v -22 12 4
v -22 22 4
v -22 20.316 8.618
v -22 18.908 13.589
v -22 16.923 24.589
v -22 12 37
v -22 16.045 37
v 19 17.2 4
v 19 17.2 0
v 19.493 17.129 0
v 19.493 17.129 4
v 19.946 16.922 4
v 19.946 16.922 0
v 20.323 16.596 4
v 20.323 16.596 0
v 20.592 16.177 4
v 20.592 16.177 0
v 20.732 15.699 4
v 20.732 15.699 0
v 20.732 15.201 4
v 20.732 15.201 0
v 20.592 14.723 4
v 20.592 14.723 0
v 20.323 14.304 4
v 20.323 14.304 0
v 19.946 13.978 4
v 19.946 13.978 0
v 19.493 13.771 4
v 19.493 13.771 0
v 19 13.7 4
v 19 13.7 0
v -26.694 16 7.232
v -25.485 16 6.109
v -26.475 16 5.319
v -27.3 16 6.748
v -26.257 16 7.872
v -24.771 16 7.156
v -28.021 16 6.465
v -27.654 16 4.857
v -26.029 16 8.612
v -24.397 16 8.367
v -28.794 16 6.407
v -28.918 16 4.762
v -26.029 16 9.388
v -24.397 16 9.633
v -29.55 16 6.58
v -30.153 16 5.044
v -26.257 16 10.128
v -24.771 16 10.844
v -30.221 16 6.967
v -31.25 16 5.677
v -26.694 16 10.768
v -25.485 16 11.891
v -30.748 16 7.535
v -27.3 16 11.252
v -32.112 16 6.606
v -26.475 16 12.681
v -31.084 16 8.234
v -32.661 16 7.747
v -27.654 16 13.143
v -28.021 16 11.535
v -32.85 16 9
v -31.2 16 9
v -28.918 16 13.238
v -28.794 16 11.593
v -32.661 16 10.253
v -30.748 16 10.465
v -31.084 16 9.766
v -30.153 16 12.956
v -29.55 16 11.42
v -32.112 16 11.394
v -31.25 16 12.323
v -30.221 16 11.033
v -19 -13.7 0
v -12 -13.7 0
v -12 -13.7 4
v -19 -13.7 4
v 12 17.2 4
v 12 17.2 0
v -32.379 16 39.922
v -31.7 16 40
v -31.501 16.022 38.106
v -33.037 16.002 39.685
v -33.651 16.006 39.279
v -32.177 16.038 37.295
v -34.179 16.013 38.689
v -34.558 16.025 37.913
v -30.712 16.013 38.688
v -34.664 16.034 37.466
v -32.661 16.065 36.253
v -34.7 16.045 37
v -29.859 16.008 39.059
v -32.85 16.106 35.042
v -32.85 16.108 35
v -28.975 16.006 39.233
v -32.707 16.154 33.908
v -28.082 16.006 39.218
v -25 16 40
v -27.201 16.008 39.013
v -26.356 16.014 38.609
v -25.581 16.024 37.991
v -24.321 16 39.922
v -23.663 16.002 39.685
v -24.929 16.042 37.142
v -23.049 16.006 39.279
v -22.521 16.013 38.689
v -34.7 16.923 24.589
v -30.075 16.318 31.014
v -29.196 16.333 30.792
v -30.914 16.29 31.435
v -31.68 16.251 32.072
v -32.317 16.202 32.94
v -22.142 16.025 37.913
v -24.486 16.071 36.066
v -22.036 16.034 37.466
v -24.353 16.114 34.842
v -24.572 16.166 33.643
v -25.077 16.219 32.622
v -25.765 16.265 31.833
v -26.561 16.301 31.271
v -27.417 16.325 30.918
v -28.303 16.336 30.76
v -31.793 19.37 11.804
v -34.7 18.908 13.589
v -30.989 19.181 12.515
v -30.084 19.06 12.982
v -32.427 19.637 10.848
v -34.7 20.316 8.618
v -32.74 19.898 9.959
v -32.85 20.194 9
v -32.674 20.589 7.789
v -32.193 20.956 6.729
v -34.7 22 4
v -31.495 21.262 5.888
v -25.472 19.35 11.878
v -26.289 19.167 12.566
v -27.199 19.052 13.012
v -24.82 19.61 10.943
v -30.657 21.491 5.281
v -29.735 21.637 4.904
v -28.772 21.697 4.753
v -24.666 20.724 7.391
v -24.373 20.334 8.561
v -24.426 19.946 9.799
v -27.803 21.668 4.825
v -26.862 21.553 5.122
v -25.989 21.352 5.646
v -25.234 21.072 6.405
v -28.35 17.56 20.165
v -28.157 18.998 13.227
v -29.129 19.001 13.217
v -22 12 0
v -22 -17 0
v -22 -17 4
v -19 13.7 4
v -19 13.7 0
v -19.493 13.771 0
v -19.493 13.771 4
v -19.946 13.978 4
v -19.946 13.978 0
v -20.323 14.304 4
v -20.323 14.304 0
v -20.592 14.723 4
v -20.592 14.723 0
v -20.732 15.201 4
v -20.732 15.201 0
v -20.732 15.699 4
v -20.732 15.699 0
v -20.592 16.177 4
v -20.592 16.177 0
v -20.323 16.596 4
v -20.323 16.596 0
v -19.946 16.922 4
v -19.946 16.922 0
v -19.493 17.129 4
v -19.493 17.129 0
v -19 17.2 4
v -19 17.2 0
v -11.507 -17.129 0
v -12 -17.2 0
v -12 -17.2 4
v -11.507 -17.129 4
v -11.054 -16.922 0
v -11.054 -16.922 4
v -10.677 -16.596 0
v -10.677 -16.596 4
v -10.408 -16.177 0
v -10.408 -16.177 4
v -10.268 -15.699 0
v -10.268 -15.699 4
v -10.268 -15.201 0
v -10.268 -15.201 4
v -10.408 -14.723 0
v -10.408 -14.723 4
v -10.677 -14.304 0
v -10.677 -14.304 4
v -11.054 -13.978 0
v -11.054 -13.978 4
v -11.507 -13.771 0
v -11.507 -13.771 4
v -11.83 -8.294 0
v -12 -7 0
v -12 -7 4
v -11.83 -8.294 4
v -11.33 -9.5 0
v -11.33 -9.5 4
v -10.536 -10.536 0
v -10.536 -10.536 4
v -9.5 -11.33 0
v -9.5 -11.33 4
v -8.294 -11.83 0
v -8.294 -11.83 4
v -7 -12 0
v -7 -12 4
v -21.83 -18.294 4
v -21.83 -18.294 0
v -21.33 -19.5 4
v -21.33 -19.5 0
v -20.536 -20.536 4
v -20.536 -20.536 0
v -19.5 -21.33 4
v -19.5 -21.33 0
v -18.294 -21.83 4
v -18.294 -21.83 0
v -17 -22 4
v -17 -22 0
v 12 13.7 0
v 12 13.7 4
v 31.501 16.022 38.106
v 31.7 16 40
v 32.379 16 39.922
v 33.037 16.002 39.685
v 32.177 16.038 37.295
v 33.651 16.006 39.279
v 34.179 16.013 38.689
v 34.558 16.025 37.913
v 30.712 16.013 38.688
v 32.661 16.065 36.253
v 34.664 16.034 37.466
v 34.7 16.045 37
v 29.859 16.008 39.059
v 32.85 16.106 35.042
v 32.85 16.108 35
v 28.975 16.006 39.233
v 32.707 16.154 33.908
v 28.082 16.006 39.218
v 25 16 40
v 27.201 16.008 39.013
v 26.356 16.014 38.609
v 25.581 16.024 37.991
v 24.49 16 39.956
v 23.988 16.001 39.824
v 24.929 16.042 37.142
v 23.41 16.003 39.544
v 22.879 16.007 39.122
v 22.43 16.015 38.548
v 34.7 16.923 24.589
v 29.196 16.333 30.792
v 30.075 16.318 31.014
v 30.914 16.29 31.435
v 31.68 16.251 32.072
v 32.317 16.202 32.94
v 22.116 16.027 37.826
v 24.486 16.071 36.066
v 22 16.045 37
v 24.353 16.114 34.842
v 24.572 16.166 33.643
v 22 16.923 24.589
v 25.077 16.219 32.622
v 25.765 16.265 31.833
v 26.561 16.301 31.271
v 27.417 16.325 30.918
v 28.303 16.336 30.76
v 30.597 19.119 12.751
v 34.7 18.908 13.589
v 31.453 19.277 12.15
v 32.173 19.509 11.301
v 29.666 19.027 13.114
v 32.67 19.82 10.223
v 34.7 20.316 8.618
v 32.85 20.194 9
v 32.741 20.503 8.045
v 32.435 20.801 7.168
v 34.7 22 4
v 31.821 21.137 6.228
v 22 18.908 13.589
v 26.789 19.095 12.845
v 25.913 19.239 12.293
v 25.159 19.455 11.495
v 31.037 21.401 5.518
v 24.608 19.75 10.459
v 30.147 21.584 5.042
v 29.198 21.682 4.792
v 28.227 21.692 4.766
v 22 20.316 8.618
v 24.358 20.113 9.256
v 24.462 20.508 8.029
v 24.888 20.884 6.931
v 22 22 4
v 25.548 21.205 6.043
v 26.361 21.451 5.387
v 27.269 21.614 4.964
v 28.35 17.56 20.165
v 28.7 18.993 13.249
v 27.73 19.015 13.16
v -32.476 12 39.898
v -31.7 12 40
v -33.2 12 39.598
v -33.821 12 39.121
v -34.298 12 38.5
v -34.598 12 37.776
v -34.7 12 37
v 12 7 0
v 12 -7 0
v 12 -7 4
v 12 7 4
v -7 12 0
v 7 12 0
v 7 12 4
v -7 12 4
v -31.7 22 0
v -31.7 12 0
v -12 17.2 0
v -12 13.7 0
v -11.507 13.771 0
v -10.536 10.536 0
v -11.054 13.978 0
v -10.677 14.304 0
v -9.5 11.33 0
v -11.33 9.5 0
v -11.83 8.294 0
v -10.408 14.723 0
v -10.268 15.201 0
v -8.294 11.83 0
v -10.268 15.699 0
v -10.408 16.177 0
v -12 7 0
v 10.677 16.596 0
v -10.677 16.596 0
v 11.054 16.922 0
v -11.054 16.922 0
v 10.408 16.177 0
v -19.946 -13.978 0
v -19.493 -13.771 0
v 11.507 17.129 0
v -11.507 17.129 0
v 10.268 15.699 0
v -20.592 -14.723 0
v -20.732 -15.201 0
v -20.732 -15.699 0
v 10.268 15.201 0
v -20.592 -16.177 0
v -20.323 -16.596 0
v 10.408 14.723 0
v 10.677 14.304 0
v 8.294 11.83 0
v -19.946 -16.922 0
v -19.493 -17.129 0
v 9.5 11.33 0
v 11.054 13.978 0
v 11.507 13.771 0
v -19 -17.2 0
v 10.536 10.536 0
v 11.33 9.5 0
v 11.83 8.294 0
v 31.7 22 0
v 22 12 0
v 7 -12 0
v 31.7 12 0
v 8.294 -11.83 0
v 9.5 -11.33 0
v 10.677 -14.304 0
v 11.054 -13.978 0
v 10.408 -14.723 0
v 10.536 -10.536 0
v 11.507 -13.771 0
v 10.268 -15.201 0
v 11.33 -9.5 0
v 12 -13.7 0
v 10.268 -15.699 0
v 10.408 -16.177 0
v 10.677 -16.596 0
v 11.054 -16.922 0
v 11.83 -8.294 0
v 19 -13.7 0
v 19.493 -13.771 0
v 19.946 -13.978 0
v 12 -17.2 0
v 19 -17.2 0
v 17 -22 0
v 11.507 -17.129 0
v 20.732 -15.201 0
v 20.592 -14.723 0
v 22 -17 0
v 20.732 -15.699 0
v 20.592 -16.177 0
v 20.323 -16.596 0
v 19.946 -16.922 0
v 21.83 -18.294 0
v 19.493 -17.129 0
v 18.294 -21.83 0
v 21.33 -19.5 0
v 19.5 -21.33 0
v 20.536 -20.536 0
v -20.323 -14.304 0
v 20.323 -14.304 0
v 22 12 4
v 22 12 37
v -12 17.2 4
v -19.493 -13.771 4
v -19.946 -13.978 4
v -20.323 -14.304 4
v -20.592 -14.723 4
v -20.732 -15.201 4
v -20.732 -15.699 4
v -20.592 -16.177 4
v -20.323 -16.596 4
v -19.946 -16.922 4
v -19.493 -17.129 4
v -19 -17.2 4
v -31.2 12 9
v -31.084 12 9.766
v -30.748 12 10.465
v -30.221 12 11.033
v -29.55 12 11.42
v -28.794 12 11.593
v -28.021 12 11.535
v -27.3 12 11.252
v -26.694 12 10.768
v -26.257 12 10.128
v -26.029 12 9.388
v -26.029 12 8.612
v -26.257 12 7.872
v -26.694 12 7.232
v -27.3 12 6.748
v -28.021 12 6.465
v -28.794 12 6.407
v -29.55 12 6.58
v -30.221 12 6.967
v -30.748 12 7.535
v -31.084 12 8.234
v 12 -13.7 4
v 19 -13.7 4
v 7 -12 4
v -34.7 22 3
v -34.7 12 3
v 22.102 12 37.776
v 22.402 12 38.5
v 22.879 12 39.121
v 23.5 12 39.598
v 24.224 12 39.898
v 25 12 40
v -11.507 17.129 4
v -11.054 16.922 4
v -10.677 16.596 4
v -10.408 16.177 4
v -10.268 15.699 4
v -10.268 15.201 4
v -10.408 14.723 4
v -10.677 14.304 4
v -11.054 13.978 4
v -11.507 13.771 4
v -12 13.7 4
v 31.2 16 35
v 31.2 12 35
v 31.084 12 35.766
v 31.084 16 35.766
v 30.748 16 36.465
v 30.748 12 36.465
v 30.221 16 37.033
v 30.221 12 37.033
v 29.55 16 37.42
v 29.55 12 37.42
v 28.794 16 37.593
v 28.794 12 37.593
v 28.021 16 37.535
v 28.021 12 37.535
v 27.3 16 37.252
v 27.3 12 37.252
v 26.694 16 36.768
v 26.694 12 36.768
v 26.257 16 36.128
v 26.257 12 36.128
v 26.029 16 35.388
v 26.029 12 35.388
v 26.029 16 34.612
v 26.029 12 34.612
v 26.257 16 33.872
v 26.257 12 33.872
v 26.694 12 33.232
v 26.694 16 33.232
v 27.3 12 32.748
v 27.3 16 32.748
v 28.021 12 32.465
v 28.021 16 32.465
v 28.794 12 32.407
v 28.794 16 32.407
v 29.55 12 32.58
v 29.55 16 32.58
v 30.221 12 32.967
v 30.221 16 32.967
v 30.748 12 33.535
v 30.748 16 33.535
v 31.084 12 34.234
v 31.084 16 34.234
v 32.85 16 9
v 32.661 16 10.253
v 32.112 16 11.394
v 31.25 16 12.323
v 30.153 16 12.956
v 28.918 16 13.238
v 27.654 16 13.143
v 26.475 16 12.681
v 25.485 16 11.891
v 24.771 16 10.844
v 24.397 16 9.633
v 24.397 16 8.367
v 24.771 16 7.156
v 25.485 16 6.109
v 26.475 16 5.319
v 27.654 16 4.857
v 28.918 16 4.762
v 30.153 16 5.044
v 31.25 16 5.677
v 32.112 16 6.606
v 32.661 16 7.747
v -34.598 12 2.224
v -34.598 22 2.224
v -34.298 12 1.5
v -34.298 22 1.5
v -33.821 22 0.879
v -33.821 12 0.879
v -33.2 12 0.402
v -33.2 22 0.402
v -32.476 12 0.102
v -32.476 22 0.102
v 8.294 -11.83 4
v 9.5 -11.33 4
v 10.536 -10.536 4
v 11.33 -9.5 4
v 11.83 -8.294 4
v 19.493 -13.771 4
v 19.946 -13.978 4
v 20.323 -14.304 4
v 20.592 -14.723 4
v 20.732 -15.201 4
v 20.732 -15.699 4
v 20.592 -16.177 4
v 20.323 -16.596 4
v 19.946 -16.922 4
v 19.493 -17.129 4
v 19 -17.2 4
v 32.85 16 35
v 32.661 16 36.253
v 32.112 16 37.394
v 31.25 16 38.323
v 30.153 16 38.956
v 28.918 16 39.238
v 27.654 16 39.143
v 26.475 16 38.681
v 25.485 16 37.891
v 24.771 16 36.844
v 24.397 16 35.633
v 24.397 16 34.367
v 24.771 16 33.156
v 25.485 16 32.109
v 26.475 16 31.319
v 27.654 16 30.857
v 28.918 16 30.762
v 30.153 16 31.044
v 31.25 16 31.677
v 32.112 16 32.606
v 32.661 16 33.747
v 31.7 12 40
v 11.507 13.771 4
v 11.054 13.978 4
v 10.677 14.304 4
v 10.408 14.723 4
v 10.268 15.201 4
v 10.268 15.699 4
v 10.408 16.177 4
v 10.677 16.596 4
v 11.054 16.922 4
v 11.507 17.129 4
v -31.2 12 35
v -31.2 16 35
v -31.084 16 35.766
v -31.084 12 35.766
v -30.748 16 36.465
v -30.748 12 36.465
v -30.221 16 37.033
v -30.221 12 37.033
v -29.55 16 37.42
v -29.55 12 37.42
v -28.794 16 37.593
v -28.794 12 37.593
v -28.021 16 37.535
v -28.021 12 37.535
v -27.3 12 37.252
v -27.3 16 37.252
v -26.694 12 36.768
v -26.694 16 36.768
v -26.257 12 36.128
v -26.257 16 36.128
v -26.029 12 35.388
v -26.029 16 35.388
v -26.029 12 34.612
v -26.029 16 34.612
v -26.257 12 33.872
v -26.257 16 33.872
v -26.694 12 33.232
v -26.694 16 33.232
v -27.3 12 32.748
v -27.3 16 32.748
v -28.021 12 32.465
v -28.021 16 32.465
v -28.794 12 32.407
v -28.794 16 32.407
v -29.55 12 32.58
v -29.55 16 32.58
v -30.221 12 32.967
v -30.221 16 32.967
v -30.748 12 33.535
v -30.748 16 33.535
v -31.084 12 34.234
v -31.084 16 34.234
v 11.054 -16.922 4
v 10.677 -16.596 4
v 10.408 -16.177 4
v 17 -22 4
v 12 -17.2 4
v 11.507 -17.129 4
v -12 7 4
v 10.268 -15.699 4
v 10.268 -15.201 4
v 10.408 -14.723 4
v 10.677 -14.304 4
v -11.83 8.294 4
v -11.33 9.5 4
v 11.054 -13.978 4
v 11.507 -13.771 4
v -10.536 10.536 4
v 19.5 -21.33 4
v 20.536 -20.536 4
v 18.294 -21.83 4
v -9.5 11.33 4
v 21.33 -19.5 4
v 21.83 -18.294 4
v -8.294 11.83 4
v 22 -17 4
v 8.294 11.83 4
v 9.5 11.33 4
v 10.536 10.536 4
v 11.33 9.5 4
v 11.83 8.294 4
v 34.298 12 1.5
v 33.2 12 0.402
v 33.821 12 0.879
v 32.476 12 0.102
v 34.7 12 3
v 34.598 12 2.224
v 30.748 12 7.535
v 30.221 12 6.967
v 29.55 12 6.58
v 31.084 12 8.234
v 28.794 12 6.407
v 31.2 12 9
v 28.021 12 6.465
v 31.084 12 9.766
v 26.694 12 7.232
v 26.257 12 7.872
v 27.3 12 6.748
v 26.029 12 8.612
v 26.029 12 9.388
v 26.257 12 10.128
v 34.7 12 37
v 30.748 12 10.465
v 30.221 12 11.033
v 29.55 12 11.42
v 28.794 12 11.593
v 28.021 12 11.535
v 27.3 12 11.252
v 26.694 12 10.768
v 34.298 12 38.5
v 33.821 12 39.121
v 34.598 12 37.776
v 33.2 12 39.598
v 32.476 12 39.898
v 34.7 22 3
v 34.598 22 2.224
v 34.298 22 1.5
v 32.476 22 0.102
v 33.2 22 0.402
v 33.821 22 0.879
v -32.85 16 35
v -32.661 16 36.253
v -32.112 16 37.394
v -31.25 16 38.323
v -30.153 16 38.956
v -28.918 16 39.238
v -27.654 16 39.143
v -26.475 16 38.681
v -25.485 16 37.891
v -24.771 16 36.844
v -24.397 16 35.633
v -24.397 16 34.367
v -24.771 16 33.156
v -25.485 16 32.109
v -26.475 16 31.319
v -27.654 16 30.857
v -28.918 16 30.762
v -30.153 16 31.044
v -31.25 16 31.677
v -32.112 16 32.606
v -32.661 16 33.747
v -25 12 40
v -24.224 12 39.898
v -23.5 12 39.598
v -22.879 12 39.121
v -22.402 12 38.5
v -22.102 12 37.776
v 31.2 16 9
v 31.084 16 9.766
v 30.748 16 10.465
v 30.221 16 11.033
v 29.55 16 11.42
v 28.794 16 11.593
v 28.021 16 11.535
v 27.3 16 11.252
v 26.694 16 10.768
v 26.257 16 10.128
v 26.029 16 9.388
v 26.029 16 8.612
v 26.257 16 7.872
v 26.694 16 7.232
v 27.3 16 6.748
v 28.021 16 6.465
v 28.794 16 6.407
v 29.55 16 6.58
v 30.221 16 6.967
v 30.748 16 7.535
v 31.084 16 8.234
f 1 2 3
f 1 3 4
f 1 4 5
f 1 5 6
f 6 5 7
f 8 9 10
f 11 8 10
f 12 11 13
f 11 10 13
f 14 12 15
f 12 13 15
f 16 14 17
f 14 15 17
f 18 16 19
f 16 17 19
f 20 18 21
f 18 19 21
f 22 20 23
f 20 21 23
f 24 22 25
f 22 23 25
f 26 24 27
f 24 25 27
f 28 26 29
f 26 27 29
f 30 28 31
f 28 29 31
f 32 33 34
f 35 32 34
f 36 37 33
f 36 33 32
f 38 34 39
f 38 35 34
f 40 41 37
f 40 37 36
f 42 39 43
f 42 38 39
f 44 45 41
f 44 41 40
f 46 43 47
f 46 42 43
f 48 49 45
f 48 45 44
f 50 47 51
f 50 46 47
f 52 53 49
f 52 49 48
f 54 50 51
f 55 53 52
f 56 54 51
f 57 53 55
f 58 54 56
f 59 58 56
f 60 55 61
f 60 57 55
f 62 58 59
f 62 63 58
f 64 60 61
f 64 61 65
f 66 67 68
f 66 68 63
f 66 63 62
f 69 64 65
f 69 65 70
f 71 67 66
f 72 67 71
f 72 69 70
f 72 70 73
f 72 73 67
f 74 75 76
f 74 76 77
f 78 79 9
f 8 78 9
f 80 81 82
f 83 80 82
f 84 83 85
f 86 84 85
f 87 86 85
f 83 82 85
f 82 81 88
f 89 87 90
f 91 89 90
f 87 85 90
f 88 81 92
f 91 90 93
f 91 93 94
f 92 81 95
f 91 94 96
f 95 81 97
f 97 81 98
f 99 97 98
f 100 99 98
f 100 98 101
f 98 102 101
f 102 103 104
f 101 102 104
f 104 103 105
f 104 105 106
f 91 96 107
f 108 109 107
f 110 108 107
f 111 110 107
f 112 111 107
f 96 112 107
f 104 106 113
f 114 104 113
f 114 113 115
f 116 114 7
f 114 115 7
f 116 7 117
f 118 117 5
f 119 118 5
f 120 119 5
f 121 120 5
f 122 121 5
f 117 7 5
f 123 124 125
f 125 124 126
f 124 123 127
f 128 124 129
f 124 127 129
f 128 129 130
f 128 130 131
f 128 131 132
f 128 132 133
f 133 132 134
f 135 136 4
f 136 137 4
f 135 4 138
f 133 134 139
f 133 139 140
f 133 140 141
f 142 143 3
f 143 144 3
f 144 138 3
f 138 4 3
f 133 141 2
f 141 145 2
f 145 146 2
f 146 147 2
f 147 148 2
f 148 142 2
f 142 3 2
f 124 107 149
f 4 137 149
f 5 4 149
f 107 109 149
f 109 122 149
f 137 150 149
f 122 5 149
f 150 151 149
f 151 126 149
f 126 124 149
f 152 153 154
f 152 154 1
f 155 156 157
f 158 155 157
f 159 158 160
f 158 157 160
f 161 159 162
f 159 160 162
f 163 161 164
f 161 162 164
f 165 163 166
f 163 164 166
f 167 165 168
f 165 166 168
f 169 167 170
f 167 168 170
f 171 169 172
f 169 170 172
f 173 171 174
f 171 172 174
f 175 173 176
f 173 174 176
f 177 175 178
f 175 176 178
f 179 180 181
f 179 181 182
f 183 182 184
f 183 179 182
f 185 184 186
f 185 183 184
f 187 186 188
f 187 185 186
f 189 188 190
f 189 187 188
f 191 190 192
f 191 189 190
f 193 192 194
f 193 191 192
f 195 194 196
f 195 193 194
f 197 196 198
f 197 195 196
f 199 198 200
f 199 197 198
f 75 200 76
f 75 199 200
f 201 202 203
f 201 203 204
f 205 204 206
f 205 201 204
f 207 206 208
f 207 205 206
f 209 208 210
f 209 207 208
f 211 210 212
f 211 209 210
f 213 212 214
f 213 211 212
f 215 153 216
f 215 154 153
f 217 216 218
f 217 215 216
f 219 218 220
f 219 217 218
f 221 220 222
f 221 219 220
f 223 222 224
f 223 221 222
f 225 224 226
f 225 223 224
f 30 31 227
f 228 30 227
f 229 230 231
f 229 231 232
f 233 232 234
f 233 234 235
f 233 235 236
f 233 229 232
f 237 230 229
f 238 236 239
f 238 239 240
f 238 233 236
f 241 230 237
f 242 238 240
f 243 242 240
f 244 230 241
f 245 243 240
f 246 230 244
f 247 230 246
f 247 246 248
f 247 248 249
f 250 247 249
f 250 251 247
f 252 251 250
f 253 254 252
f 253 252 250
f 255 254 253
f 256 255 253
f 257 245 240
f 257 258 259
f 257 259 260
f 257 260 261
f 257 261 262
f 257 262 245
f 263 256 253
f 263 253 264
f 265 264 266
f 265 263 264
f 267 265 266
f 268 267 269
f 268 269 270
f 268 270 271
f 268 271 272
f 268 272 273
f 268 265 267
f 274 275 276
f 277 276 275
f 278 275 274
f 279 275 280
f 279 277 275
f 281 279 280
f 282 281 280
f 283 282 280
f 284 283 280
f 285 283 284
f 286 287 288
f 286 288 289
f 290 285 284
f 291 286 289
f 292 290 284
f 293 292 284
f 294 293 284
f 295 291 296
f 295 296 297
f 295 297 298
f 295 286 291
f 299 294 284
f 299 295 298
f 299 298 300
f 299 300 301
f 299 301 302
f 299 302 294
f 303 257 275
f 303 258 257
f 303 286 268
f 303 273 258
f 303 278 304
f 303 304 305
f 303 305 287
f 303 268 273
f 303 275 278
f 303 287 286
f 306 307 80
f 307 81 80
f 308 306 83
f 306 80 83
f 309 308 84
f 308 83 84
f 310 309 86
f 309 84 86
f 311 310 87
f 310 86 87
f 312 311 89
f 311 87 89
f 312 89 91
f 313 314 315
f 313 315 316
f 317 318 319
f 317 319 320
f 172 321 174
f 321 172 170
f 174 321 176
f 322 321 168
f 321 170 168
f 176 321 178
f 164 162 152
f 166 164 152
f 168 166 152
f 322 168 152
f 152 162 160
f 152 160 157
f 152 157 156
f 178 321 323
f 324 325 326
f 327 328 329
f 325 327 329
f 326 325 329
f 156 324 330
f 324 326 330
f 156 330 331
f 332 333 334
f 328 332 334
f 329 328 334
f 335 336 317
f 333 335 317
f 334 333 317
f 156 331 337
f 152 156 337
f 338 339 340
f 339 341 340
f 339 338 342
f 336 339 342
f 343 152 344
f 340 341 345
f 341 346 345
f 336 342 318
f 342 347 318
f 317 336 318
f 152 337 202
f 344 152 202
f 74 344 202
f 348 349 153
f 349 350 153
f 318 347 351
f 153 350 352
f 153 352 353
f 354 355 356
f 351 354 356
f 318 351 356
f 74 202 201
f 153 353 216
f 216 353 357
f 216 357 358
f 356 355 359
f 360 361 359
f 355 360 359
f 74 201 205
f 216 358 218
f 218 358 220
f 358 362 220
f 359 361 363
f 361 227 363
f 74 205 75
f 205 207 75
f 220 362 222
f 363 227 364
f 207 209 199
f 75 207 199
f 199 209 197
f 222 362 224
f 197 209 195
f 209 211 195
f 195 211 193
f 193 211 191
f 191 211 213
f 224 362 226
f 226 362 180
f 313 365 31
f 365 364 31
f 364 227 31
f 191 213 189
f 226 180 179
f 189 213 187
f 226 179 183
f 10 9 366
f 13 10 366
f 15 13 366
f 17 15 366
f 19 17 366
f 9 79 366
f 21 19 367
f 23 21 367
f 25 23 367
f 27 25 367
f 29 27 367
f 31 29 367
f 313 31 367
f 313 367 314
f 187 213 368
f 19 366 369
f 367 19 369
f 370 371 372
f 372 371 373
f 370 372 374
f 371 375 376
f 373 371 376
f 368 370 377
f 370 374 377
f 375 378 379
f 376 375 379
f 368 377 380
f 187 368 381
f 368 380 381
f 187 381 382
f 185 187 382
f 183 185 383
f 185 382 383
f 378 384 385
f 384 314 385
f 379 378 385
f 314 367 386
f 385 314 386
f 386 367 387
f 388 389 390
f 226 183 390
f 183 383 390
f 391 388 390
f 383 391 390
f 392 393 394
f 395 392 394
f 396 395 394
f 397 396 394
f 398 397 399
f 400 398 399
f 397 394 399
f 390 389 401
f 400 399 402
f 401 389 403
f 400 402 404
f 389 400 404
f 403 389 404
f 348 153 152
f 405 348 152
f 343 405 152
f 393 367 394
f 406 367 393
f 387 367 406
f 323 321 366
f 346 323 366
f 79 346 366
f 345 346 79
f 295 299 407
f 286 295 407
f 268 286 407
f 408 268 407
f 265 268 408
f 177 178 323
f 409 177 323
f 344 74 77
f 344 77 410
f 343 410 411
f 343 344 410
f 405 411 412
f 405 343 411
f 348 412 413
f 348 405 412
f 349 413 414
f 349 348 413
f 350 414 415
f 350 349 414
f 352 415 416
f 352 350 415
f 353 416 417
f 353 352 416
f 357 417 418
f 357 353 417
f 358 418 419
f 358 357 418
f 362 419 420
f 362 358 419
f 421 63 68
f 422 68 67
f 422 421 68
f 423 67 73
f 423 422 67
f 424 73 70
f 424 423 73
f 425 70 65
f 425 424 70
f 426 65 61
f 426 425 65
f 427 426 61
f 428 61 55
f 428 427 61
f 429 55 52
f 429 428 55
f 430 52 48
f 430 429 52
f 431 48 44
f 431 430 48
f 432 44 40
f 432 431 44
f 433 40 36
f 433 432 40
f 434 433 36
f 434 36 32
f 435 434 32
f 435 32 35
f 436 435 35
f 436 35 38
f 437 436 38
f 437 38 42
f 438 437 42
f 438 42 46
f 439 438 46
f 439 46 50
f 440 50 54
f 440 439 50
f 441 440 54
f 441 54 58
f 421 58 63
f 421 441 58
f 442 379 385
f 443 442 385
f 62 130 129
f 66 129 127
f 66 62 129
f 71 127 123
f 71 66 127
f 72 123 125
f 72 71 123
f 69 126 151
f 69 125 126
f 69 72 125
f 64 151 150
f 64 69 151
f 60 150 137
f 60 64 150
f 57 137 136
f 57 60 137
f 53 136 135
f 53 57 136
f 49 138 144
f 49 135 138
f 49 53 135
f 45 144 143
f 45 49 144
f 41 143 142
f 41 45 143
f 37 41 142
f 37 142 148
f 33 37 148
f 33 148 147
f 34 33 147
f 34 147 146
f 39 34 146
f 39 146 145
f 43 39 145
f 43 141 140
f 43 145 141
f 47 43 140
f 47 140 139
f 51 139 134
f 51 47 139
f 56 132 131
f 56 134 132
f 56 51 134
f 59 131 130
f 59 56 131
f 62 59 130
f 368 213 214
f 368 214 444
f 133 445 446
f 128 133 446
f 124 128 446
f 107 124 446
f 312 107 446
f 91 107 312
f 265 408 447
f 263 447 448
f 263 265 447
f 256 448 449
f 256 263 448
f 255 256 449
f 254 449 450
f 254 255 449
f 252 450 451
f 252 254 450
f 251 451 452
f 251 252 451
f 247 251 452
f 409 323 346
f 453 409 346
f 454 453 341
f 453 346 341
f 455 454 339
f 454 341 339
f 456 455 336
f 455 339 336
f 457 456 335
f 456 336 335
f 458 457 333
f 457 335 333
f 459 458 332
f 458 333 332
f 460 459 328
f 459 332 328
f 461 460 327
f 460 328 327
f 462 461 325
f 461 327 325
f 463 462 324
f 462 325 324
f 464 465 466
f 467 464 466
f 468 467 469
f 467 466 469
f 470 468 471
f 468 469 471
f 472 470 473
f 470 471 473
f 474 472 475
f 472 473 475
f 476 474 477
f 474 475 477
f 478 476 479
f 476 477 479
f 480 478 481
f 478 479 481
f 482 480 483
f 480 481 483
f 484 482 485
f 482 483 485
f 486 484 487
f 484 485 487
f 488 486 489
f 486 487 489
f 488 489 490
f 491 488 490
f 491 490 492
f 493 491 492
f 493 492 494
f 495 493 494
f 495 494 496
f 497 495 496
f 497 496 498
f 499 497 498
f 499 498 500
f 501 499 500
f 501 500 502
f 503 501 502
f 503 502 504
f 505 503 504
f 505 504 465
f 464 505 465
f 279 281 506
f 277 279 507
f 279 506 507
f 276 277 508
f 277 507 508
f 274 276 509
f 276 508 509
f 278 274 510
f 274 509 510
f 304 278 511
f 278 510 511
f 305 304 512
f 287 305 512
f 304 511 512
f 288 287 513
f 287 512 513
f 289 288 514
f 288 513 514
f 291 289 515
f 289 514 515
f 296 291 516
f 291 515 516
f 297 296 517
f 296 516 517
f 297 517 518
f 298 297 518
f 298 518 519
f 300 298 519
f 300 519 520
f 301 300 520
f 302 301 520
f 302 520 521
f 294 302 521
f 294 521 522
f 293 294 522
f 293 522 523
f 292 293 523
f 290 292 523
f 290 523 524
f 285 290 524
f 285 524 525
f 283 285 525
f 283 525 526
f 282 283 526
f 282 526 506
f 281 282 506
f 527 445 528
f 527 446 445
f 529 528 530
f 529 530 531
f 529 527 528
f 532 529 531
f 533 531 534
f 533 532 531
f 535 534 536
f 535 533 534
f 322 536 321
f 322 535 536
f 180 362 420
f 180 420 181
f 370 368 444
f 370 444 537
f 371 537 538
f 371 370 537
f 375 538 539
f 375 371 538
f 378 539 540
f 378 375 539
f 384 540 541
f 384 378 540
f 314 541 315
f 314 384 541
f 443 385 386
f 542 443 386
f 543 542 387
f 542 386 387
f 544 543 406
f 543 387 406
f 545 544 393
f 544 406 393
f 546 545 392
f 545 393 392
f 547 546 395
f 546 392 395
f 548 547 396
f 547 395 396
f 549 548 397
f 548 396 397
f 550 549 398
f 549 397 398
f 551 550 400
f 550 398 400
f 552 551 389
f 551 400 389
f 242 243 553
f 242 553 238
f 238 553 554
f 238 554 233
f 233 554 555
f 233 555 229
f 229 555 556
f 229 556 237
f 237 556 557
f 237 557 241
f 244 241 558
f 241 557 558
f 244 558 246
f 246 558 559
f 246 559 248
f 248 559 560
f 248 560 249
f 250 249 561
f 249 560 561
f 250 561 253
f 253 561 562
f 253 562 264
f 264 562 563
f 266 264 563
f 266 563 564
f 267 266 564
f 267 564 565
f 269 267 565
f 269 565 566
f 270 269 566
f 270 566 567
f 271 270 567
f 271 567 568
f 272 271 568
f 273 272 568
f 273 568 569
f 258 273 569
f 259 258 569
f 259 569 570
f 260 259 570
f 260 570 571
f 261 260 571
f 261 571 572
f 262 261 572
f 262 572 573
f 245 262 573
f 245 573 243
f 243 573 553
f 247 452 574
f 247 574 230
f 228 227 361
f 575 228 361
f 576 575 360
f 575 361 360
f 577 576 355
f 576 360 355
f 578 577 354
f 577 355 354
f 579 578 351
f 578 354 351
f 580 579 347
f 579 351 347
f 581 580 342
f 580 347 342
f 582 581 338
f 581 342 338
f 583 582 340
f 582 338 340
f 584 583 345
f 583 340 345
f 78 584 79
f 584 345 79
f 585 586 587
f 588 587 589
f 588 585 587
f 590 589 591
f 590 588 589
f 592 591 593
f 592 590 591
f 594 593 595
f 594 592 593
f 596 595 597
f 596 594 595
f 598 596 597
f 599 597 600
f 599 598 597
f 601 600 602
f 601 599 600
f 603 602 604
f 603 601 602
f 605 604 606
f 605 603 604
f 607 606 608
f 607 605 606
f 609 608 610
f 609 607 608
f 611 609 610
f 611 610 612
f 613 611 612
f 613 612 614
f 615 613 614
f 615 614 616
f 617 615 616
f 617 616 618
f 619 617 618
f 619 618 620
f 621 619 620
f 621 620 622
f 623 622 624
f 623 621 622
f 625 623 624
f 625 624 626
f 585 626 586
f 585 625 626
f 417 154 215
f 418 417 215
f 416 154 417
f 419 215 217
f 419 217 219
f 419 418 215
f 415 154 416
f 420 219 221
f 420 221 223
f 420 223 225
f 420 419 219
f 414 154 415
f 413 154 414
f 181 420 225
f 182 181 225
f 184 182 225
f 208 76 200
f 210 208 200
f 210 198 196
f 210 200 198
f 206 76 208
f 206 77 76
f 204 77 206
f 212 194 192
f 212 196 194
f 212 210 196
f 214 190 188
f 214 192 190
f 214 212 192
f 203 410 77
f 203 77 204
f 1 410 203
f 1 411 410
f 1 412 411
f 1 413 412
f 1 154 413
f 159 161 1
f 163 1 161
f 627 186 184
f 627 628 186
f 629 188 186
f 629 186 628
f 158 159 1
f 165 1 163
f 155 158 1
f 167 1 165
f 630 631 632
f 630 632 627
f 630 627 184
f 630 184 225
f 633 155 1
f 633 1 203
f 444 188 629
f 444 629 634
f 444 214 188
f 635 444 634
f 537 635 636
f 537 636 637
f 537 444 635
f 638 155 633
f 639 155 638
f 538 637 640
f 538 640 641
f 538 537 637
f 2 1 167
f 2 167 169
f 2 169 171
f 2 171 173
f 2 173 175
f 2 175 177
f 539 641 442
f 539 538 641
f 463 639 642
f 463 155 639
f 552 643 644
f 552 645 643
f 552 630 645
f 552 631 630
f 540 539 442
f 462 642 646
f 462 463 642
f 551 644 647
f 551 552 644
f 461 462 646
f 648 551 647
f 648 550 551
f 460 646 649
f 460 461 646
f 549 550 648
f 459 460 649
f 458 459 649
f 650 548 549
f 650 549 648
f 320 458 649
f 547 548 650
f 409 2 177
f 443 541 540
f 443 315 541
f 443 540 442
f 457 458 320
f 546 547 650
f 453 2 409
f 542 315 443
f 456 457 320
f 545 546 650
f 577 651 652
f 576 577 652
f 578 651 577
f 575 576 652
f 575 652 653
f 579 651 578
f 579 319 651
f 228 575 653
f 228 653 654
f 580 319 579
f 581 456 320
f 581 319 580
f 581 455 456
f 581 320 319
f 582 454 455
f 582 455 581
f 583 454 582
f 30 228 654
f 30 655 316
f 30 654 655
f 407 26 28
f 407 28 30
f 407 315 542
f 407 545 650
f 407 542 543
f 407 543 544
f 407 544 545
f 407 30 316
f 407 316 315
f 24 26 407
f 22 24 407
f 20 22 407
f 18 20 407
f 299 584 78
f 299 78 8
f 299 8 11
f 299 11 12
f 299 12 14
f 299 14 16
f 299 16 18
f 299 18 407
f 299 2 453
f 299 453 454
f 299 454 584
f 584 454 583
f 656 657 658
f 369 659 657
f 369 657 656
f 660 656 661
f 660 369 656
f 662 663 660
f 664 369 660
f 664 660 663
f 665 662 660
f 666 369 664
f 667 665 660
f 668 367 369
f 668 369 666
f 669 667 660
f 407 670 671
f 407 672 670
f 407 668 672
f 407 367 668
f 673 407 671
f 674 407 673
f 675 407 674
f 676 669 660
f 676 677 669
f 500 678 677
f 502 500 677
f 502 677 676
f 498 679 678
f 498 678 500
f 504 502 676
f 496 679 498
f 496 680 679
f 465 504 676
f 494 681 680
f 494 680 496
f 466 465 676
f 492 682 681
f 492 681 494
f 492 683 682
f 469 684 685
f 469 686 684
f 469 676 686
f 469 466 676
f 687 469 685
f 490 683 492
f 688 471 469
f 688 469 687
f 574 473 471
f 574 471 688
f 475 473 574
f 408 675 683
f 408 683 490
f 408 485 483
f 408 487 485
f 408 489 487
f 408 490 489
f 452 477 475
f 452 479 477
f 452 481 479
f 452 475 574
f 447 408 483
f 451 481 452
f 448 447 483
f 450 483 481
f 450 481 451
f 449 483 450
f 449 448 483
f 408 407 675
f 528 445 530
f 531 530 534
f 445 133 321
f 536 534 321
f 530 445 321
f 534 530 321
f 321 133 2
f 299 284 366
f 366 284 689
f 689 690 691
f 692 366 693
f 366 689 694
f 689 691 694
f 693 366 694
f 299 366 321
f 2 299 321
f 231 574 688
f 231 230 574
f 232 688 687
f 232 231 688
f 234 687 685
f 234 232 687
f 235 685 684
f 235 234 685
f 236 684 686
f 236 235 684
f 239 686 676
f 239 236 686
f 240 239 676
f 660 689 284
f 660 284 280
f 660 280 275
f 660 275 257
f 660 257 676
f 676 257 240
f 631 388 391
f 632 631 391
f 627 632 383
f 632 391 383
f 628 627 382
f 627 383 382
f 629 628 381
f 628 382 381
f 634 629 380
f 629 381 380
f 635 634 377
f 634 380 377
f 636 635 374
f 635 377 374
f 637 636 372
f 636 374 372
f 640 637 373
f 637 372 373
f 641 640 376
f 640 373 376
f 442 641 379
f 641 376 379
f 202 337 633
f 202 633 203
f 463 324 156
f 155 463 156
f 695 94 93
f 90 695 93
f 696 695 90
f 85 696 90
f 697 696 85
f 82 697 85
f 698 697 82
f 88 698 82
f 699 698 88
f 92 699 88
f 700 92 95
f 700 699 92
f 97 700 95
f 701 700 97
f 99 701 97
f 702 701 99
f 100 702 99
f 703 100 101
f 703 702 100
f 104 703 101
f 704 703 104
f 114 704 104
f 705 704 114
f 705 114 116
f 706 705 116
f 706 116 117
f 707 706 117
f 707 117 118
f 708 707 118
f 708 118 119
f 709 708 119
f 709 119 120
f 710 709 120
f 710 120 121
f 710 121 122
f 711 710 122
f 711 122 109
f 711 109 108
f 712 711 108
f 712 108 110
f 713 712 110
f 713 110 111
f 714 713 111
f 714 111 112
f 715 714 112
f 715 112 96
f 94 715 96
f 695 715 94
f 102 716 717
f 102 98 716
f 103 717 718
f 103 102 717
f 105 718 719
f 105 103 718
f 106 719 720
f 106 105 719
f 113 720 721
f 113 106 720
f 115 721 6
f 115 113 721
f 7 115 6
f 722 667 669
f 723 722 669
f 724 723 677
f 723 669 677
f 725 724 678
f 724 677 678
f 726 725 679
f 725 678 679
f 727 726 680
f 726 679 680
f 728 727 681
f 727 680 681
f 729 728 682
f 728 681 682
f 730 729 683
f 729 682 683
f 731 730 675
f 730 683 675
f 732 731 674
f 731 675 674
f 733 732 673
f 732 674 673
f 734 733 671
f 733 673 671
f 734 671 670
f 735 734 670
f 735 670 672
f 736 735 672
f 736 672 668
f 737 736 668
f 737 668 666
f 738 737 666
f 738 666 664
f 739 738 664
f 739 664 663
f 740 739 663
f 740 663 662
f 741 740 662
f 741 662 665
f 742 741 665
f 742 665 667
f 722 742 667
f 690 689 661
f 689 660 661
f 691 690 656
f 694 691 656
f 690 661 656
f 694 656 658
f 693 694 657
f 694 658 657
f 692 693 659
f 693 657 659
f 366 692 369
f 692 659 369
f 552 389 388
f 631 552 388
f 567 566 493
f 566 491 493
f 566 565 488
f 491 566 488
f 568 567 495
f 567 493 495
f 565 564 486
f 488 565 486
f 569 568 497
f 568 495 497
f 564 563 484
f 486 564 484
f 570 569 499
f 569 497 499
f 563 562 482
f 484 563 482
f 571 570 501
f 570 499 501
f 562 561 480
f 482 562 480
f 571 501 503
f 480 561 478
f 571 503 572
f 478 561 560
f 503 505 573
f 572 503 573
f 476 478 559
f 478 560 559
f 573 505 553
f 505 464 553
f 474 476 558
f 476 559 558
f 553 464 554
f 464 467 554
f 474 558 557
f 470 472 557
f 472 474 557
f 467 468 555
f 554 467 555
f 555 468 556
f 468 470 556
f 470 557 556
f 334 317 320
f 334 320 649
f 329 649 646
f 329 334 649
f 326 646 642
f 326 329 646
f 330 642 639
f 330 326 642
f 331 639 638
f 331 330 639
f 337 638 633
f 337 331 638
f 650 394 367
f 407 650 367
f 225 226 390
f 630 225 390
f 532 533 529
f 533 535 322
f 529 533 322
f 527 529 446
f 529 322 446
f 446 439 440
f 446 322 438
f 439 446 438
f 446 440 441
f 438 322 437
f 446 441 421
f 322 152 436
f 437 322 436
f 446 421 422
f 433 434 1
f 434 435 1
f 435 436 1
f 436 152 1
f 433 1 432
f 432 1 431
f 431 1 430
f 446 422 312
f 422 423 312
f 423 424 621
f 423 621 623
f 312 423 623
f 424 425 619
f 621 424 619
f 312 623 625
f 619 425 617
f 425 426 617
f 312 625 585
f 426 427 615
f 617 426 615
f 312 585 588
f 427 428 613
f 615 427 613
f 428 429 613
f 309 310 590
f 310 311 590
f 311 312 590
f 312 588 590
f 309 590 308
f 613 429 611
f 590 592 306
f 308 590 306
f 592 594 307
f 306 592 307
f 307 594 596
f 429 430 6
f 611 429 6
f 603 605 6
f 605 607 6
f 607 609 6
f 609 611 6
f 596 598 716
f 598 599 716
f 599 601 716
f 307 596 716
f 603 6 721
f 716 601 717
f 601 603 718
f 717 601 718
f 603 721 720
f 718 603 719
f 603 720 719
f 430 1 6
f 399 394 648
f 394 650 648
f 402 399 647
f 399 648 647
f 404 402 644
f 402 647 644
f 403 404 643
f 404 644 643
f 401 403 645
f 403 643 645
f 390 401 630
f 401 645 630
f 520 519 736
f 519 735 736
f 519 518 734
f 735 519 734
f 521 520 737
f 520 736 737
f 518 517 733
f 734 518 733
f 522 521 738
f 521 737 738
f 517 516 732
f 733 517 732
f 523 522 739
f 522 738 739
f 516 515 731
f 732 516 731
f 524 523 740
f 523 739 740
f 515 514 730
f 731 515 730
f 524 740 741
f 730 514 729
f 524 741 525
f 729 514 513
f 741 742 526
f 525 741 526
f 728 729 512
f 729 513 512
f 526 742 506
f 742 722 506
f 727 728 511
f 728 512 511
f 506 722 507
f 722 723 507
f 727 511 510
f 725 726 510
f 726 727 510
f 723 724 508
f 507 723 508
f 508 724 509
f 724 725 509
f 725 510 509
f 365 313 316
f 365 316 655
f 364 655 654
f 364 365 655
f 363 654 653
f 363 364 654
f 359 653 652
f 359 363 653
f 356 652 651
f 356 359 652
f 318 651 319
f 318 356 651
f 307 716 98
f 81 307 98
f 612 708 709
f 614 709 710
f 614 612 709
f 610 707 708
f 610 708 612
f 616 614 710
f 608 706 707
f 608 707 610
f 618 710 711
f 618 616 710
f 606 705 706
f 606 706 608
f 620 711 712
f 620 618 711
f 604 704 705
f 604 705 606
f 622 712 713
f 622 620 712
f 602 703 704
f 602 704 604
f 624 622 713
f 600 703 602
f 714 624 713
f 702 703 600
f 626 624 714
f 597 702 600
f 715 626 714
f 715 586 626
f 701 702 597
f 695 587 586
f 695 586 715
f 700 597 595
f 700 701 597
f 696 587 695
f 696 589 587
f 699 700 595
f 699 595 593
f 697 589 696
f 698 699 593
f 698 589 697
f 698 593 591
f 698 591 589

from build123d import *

# Parameters (mm, degrees)
SKETCH1_W           = 44
SKETCH1_H           = 44
BOSS_EXTRUDE1_DEPTH = 4
BOSS_EXTRUDE2_DEPTH = 12.7
SKETCH3_R           = 2.6
CUT_EXTRUDE1_DEPTH  = 63.929246102
SKETCH4_R           = 4.25
CUT_EXTRUDE2_DEPTH  = 66.177373489
FILLET1_R           = 3
FILLET2_R           = 5


with BuildPart() as part:
    # Sketch1 → Boss-Extrude1 (new body)
    with BuildSketch(Plane.XY):
        Rectangle(SKETCH1_W, SKETCH1_H)
        with BuildLine():
            Line((7, 12), (-7, 12))
            ThreePointArc((-7, 12), (-10.535533906, 10.535533906), (-12, 7))
            Line((-12, 7), (-12, -7))
            ThreePointArc((-12, -7), (-10.535533906, -10.535533906), (-7, -12))
            Line((-7, -12), (7, -12))
            ThreePointArc((7, -12), (10.535533906, -10.535533906), (12, -7))
            Line((12, -7), (12, 7))
            ThreePointArc((12, 7), (10.535533906, 10.535533906), (7, 12))
        make_face(mode=Mode.SUBTRACT)
        with BuildLine():
            Line((-19, 17.2), (-12, 17.2))
            ThreePointArc((-12, 17.2), (-10.25, 15.45), (-12, 13.7))
            Line((-12, 13.7), (-19, 13.7))
            ThreePointArc((-19, 13.7), (-20.75, 15.45), (-19, 17.2))
        make_face(mode=Mode.SUBTRACT)
        with BuildLine():
            Line((-19, -17.2), (-12, -17.2))
            ThreePointArc((-12, -17.2), (-10.25, -15.45), (-12, -13.7))
            Line((-12, -13.7), (-19, -13.7))
            ThreePointArc((-19, -13.7), (-20.75, -15.45), (-19, -17.2))
        make_face(mode=Mode.SUBTRACT)
        with BuildLine():
            Line((12, 17.2), (19, 17.2))
            ThreePointArc((19, 17.2), (20.75, 15.45), (19, 13.7))
            Line((19, 13.7), (12, 13.7))
            ThreePointArc((12, 13.7), (10.25, 15.45), (12, 17.2))
        make_face(mode=Mode.SUBTRACT)
        with BuildLine():
            Line((12, -13.7), (19, -13.7))
            ThreePointArc((19, -13.7), (20.75, -15.45), (19, -17.2))
            Line((19, -17.2), (12, -17.2))
            ThreePointArc((12, -17.2), (10.25, -15.45), (12, -13.7))
        make_face(mode=Mode.SUBTRACT)
    extrude(amount=BOSS_EXTRUDE1_DEPTH)

    # Sketch2 → Boss-Extrude2 (add)
    with BuildSketch(Plane(origin=(22, 0, 0), x_dir=(0, 0, -1), z_dir=(1, 0, 0))):
        with BuildLine():
            Line((0, 12), (-40, 12))
            Line((-40, 12), (-40, 16))
            add(Edge.make_bspline(
                [(-40, 16), (-18.32972451, 16.119369884), (-4, 22)],
                knots=[0, 0, 0, 1, 1, 1], degree=2))
            Line((-4, 22), (0, 22))
            Line((0, 22), (0, 12))
        make_face()
    boss_extrude2 = extrude(amount=BOSS_EXTRUDE2_DEPTH)

    # Sketch3 → Cut-Extrude1 (cut, through all)
    with BuildSketch(Plane.XZ.offset(-12)):
        with Locations((28.6, 35)):
            Circle(SKETCH3_R)
        with Locations((28.6, 9)):
            Circle(SKETCH3_R)
    cut_extrude1 = extrude(amount=-CUT_EXTRUDE1_DEPTH, mode=Mode.SUBTRACT)

    # Sketch4 → Cut-Extrude2 (cut, through all)
    with BuildSketch(Plane(origin=(0, 16, 0), x_dir=(-1, 0, 0), z_dir=(0, -1, 0))):
        with Locations(Location((-28.6, -9, 0), (0, 0, 180))):
            Circle(SKETCH4_R)
        with Locations(Location((-28.6, -35, 0), (0, 0, 180))):
            Circle(SKETCH4_R)
    cut_extrude2 = extrude(amount=-CUT_EXTRUDE2_DEPTH, mode=Mode.SUBTRACT)

    # Mirror1: Boss-Extrude2, Cut-Extrude1, Cut-Extrude2 across plane
    add(boss_extrude2.mirror(Plane(origin=(0, 0, 0), x_dir=(0, 0, 1), z_dir=(1, 0, 0))))
    add(cut_extrude1.mirror(Plane(origin=(0, 0, 0), x_dir=(0, 0, 1), z_dir=(1, 0, 0))), mode=Mode.SUBTRACT)
    add(cut_extrude2.mirror(Plane(origin=(0, 0, 0), x_dir=(0, 0, 1), z_dir=(1, 0, 0))), mode=Mode.SUBTRACT)

    # Fillet1
    fillet1_edges = [part.edges().sort_by_distance(p)[0] for p in [
        (34.7, 17, 0),
        (34.7, 14, 40),
        (-22, 14, 40),
        (-34.7, 17, 0),
        (-34.7, 14, 40),
        (22, 14, 40),
    ]]
    fillet(fillet1_edges, radius=FILLET1_R)

    # Fillet2
    fillet2_edges = [part.edges().sort_by_distance(p)[0] for p in [
        (22, -22, 2),
        (-22, -22, 2),
    ]]
    fillet(fillet2_edges, radius=FILLET2_R)


solid = part.part
